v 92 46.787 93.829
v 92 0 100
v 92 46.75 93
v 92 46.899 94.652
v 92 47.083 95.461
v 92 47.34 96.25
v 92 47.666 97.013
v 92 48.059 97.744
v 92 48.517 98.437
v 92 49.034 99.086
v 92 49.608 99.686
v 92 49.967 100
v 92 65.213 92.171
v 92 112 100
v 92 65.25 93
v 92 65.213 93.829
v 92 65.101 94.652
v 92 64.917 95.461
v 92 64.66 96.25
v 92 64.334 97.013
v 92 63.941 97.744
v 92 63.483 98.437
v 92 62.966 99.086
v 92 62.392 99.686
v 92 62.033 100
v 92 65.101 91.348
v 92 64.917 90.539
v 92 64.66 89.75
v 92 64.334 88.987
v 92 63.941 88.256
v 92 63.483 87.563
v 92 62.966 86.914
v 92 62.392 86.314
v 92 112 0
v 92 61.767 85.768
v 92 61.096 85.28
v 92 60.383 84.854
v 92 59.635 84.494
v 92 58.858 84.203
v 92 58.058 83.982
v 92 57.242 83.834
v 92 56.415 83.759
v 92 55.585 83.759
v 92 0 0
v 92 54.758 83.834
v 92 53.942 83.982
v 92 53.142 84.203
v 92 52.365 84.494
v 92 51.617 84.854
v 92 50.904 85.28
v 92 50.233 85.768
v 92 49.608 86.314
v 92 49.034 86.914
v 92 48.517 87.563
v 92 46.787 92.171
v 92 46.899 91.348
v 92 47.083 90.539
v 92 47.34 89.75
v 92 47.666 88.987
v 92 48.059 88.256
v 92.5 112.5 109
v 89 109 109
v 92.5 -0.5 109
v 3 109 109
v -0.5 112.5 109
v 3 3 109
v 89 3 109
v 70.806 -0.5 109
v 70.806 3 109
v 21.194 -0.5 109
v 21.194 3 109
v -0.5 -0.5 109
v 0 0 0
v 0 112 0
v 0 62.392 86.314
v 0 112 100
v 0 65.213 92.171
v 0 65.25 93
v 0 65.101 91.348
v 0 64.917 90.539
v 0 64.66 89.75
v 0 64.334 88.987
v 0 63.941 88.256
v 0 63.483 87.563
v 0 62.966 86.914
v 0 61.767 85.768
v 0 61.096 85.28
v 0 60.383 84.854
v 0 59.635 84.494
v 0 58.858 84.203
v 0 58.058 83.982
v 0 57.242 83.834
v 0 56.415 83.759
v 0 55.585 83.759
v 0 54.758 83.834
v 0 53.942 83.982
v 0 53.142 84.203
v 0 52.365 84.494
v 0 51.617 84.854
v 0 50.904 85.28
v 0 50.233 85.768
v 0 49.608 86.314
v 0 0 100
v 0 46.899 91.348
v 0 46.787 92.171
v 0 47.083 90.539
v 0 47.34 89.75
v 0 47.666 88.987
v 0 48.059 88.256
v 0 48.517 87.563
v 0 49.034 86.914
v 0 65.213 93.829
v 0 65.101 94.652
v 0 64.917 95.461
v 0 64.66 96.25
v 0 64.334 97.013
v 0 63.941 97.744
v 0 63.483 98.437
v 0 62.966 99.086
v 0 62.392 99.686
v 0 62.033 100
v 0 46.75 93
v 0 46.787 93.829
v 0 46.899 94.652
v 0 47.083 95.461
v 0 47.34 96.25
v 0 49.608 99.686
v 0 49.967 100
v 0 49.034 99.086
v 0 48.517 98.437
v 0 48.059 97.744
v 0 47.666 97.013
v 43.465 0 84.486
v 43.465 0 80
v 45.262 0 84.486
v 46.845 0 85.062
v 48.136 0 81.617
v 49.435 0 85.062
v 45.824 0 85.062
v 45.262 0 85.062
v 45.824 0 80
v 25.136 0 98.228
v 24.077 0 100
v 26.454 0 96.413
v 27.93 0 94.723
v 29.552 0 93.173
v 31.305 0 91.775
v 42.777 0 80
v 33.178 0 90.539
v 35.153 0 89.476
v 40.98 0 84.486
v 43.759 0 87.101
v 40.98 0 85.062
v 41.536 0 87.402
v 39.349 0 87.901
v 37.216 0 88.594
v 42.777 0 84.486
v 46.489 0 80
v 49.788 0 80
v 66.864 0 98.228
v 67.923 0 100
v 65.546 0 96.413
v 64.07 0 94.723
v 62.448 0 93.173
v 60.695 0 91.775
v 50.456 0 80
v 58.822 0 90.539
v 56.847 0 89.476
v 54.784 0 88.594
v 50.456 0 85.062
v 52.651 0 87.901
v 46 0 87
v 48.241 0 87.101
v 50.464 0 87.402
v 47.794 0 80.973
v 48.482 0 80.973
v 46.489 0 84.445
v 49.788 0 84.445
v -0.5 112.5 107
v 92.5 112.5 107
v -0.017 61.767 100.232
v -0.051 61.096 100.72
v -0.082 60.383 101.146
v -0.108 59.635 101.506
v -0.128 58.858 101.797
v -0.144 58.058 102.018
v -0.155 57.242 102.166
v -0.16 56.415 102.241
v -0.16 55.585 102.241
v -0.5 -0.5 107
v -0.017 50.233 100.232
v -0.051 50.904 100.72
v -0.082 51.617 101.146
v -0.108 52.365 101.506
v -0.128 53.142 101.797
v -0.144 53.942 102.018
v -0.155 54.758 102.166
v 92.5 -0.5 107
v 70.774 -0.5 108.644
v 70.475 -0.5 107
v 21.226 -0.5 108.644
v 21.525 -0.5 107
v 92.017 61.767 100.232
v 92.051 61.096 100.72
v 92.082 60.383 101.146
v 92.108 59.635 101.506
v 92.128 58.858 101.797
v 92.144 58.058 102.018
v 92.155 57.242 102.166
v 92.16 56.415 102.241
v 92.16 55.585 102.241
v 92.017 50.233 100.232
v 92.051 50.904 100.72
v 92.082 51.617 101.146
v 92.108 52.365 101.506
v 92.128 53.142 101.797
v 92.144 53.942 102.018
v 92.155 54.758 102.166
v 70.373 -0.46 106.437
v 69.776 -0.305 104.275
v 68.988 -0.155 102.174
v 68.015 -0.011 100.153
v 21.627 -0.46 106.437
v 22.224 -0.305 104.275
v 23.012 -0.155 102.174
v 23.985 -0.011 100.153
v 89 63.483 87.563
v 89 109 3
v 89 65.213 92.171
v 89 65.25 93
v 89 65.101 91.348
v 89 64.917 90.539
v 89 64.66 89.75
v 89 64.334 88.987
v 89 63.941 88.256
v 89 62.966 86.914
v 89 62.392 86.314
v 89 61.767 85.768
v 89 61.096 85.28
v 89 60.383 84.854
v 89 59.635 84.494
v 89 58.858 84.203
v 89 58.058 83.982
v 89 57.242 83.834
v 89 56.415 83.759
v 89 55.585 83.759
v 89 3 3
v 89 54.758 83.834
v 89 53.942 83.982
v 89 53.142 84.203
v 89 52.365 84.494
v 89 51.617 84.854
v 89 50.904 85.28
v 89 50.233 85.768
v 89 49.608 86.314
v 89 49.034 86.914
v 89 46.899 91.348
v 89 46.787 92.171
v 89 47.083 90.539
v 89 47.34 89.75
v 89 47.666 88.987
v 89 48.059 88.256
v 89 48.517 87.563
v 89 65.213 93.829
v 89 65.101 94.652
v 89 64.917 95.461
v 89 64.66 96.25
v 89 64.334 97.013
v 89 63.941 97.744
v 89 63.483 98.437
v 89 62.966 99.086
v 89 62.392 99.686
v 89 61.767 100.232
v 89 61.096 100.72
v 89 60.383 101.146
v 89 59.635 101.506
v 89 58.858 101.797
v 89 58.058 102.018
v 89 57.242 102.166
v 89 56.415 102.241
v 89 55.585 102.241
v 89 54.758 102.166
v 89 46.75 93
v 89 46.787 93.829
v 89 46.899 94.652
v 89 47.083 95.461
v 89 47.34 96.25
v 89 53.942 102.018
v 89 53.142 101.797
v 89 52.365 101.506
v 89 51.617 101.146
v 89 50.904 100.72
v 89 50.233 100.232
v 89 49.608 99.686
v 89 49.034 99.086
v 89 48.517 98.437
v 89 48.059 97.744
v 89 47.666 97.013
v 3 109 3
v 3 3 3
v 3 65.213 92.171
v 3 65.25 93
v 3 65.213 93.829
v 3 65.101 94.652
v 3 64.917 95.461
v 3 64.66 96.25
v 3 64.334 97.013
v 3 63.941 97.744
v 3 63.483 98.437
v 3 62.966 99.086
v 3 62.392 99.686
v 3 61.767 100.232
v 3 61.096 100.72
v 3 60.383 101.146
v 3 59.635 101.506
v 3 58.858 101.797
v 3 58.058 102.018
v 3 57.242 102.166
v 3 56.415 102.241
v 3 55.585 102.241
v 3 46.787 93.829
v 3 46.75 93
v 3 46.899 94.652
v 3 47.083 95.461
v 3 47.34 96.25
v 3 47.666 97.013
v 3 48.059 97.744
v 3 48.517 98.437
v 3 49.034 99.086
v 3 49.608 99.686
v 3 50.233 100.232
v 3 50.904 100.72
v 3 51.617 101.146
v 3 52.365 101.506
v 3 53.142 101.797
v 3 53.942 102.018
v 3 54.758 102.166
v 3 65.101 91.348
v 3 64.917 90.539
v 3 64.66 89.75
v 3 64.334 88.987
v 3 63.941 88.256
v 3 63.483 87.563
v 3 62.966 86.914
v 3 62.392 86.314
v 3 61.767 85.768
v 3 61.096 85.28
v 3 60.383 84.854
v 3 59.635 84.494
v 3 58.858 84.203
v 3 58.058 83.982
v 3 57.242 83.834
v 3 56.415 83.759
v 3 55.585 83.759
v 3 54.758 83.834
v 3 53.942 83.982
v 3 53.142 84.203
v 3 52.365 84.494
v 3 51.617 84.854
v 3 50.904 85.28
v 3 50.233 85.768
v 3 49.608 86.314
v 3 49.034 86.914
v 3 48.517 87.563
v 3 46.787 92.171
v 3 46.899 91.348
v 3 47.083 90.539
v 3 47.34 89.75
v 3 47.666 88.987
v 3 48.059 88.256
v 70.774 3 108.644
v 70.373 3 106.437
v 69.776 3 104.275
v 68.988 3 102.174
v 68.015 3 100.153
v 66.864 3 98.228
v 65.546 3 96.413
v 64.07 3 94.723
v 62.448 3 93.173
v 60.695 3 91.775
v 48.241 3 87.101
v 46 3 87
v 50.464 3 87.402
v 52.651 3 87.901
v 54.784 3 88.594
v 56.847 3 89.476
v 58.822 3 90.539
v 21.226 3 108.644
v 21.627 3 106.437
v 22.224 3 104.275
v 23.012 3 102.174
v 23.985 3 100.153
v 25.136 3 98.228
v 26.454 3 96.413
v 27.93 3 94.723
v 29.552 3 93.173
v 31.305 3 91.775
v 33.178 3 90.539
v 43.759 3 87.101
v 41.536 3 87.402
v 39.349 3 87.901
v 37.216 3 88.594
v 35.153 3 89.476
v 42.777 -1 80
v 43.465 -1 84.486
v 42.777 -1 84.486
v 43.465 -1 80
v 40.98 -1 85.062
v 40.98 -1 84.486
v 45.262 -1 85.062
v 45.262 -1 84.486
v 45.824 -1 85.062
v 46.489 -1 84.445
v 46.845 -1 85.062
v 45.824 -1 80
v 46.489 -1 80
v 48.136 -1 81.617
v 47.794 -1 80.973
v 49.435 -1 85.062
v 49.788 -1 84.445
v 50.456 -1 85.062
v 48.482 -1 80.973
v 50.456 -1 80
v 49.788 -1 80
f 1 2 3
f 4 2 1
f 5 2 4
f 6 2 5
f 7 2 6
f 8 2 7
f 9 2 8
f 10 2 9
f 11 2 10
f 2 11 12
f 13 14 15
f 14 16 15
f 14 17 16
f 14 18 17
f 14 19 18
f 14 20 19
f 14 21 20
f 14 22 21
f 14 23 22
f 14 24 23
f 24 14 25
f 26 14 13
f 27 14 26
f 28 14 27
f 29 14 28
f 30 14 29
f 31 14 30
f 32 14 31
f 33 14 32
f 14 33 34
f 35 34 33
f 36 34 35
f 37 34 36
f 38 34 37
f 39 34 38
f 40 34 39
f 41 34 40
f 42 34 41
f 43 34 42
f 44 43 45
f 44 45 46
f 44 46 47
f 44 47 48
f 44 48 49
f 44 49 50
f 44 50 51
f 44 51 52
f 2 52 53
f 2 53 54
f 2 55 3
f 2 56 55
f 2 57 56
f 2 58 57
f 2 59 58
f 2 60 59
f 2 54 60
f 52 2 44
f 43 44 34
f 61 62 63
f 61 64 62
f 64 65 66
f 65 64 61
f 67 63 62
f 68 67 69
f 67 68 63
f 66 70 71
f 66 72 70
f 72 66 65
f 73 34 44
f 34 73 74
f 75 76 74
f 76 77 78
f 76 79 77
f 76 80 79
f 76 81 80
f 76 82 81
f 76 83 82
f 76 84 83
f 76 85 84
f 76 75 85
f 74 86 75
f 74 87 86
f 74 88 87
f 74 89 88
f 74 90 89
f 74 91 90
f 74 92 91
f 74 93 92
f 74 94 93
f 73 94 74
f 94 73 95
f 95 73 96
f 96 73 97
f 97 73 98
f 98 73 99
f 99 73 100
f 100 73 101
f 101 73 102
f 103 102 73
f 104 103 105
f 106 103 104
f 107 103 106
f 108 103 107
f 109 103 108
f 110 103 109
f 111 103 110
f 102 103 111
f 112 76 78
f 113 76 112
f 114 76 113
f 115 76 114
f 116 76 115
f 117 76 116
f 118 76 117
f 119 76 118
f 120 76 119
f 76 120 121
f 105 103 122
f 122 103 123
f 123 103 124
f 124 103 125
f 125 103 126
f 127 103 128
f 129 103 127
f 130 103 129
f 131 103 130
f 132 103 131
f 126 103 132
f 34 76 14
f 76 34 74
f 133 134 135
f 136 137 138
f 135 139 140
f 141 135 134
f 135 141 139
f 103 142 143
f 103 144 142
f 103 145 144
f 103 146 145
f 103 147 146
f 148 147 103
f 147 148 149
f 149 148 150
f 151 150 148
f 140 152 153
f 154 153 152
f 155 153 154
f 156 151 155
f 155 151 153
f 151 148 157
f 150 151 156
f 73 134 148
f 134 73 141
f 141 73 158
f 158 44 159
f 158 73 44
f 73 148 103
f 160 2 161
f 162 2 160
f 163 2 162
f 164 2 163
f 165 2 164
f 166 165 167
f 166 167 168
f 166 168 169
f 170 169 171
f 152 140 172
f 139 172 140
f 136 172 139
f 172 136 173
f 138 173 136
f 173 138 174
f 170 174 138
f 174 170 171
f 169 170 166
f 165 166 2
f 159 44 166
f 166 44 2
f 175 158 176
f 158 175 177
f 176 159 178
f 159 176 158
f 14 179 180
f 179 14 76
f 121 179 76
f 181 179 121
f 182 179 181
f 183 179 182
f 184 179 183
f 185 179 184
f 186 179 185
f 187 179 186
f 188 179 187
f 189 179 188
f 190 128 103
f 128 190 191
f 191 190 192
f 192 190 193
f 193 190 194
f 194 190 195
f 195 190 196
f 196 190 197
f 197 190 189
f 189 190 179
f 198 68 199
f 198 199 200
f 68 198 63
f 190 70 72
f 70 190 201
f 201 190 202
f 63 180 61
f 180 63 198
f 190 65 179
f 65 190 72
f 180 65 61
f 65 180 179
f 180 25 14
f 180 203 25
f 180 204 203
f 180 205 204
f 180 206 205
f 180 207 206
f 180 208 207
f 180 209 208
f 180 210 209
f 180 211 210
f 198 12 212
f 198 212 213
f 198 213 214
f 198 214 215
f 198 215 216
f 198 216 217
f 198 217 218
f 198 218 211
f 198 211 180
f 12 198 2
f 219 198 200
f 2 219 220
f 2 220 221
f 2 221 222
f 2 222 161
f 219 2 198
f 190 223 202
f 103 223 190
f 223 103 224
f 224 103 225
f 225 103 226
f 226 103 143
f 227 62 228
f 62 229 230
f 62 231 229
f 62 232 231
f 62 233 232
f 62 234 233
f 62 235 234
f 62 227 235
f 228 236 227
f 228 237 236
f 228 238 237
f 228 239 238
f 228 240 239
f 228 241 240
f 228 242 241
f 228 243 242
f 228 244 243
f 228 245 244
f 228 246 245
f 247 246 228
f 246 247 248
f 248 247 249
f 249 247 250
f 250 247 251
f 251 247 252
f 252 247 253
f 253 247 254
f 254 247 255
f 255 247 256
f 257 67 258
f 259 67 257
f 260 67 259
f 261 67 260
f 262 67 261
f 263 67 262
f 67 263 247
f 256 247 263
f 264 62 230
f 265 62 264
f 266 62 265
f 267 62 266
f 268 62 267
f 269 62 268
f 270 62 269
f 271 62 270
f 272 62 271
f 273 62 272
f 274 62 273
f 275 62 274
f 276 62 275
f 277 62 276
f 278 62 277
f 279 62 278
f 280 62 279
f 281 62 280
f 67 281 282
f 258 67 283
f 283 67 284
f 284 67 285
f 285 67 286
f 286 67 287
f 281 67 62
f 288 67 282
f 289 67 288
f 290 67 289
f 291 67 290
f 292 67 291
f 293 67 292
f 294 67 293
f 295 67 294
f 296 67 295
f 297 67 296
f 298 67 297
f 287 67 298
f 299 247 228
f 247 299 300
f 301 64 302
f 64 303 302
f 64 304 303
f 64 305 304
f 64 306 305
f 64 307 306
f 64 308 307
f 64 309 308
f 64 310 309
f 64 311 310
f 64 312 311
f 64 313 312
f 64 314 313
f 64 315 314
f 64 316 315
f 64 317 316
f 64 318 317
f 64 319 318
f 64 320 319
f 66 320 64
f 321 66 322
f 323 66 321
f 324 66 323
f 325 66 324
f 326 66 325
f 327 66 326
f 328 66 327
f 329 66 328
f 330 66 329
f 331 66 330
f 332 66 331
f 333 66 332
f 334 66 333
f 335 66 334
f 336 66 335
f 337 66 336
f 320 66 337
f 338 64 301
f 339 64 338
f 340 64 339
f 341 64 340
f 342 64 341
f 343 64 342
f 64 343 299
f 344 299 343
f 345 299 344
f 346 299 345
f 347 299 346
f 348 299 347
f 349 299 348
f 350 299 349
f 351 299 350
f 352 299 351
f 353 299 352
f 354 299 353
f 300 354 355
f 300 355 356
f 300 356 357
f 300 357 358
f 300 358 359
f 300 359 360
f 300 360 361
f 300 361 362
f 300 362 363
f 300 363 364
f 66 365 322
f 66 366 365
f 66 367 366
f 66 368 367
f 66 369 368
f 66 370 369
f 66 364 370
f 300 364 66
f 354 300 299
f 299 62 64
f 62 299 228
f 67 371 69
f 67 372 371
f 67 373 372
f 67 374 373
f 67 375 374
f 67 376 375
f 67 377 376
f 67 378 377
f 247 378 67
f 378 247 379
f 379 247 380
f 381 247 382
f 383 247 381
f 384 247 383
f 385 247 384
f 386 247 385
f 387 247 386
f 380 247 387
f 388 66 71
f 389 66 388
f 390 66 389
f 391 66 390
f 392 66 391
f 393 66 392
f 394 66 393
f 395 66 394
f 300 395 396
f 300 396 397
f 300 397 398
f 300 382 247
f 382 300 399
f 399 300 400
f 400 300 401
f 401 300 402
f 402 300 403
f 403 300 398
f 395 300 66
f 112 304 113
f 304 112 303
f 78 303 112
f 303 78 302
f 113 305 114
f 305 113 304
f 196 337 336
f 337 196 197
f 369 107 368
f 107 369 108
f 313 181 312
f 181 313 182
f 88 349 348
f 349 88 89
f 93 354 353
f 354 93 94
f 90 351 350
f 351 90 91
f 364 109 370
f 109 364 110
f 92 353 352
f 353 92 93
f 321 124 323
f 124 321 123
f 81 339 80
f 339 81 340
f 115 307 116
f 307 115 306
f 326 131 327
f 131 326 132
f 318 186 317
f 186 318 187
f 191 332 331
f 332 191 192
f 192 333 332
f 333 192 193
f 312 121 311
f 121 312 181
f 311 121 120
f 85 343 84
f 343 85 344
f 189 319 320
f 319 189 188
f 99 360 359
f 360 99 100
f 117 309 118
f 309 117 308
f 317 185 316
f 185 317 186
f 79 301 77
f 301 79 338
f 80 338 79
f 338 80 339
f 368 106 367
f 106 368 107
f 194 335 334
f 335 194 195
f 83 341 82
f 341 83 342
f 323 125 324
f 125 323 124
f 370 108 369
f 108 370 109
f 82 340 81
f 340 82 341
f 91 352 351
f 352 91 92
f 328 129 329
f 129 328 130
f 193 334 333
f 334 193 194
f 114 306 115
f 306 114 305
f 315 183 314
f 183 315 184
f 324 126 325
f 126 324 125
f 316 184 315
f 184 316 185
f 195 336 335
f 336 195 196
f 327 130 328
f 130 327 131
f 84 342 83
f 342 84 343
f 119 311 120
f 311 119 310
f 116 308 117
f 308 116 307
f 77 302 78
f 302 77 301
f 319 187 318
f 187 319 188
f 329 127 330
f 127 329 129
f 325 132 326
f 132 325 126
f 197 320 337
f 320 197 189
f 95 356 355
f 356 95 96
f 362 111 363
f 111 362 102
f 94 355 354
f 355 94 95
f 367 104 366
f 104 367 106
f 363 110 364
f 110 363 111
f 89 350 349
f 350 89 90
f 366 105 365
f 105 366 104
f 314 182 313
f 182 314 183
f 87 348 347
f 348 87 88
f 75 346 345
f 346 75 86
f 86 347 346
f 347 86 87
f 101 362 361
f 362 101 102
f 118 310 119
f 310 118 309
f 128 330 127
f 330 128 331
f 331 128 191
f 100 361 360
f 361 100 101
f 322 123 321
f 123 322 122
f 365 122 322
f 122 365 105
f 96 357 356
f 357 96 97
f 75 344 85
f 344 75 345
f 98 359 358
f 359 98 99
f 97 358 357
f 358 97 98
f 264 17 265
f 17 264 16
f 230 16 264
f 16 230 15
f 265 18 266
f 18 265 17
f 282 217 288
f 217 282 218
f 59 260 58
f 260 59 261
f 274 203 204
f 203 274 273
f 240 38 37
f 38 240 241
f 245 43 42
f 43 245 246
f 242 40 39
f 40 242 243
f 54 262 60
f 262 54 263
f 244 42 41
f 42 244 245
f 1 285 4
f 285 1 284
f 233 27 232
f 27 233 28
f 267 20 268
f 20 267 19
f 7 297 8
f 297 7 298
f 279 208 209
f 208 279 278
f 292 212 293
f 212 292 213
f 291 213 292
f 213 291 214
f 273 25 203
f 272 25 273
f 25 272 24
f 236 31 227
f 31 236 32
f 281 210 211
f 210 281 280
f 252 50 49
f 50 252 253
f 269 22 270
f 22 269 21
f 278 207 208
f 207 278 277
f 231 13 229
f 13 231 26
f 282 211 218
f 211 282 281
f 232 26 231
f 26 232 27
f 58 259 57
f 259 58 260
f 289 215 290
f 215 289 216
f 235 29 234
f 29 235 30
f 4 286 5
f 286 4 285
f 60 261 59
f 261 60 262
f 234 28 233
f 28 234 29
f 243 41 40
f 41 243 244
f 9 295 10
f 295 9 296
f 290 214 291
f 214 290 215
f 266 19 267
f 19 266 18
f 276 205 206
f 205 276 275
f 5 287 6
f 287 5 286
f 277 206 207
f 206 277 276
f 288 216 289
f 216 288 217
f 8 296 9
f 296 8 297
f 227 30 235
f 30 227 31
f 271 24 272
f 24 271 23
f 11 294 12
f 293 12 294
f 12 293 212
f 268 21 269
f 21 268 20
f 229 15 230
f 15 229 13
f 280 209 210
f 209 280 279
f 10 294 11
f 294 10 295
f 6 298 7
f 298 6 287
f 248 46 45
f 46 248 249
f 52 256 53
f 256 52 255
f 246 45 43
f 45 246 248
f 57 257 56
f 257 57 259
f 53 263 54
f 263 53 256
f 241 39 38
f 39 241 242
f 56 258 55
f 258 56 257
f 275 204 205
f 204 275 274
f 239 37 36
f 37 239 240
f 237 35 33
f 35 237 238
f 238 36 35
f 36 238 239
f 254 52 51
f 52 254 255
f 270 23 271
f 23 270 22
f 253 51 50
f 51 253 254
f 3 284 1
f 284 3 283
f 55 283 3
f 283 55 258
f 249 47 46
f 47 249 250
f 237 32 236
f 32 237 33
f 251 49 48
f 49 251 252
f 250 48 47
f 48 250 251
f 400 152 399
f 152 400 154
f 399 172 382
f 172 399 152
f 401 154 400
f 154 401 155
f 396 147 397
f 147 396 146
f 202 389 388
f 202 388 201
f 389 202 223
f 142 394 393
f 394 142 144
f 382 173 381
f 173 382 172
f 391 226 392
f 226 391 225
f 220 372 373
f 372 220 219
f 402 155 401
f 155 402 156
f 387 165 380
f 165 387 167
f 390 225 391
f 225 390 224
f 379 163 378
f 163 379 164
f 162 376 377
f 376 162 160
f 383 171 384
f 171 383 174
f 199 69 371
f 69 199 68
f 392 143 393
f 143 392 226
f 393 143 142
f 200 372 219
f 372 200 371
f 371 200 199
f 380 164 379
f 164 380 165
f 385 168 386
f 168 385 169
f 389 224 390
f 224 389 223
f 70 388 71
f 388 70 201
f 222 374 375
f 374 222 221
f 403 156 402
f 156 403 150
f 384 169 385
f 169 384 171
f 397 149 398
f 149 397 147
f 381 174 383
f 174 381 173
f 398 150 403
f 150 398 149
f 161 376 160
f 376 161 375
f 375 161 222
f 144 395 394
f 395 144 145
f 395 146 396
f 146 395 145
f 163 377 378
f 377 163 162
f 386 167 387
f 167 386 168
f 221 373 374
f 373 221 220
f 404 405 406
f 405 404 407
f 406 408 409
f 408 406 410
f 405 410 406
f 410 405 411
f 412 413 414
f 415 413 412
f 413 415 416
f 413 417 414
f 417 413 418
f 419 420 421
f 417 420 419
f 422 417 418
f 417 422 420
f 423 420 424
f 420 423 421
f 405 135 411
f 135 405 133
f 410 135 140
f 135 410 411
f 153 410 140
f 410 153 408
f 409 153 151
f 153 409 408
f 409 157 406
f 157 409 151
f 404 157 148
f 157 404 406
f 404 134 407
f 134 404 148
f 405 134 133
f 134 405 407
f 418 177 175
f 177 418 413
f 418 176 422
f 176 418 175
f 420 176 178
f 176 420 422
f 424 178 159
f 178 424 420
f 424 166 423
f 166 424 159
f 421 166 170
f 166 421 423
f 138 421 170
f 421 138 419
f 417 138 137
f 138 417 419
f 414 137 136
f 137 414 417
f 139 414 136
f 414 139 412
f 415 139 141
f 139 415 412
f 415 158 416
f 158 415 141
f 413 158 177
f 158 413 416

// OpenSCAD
// configuration values
fs  = 5;


content = "TM";
font = "Droid Sans Mono Bold";

difference () {
  union () {
    difference () {
      union () {
        cube([92,112,109]);
        hull () {
          translate([0, 0, 100]) cube([92,112,1]);
          translate([-0.5,-0.5,107]) cube([93,113,2]);
        }
      }
      translate([3, 3, 3]) cube([86,106,109]);
    }
  }
  translate([-0.6, 56, 93]) rotate([90,0,90]) cylinder(r1=9.25, r2=9.25, h=3.7, $fn=70);
  translate([89, 56, 93]) rotate([90,0,90]) cylinder(r1=9.25, r2=9.25, h=3.7, $fn=70);
  translate([46, -0.6, 112]) rotate([0,90,90]) cylinder(r1=25, r2=25, h=3.7, $fn=70);
}

  translate ([41, 0, 80]) rotate([90,0,0]) {
    linear_extrude(height=1.0) {
      text(content, font=font, size=fs);
    }
  }
